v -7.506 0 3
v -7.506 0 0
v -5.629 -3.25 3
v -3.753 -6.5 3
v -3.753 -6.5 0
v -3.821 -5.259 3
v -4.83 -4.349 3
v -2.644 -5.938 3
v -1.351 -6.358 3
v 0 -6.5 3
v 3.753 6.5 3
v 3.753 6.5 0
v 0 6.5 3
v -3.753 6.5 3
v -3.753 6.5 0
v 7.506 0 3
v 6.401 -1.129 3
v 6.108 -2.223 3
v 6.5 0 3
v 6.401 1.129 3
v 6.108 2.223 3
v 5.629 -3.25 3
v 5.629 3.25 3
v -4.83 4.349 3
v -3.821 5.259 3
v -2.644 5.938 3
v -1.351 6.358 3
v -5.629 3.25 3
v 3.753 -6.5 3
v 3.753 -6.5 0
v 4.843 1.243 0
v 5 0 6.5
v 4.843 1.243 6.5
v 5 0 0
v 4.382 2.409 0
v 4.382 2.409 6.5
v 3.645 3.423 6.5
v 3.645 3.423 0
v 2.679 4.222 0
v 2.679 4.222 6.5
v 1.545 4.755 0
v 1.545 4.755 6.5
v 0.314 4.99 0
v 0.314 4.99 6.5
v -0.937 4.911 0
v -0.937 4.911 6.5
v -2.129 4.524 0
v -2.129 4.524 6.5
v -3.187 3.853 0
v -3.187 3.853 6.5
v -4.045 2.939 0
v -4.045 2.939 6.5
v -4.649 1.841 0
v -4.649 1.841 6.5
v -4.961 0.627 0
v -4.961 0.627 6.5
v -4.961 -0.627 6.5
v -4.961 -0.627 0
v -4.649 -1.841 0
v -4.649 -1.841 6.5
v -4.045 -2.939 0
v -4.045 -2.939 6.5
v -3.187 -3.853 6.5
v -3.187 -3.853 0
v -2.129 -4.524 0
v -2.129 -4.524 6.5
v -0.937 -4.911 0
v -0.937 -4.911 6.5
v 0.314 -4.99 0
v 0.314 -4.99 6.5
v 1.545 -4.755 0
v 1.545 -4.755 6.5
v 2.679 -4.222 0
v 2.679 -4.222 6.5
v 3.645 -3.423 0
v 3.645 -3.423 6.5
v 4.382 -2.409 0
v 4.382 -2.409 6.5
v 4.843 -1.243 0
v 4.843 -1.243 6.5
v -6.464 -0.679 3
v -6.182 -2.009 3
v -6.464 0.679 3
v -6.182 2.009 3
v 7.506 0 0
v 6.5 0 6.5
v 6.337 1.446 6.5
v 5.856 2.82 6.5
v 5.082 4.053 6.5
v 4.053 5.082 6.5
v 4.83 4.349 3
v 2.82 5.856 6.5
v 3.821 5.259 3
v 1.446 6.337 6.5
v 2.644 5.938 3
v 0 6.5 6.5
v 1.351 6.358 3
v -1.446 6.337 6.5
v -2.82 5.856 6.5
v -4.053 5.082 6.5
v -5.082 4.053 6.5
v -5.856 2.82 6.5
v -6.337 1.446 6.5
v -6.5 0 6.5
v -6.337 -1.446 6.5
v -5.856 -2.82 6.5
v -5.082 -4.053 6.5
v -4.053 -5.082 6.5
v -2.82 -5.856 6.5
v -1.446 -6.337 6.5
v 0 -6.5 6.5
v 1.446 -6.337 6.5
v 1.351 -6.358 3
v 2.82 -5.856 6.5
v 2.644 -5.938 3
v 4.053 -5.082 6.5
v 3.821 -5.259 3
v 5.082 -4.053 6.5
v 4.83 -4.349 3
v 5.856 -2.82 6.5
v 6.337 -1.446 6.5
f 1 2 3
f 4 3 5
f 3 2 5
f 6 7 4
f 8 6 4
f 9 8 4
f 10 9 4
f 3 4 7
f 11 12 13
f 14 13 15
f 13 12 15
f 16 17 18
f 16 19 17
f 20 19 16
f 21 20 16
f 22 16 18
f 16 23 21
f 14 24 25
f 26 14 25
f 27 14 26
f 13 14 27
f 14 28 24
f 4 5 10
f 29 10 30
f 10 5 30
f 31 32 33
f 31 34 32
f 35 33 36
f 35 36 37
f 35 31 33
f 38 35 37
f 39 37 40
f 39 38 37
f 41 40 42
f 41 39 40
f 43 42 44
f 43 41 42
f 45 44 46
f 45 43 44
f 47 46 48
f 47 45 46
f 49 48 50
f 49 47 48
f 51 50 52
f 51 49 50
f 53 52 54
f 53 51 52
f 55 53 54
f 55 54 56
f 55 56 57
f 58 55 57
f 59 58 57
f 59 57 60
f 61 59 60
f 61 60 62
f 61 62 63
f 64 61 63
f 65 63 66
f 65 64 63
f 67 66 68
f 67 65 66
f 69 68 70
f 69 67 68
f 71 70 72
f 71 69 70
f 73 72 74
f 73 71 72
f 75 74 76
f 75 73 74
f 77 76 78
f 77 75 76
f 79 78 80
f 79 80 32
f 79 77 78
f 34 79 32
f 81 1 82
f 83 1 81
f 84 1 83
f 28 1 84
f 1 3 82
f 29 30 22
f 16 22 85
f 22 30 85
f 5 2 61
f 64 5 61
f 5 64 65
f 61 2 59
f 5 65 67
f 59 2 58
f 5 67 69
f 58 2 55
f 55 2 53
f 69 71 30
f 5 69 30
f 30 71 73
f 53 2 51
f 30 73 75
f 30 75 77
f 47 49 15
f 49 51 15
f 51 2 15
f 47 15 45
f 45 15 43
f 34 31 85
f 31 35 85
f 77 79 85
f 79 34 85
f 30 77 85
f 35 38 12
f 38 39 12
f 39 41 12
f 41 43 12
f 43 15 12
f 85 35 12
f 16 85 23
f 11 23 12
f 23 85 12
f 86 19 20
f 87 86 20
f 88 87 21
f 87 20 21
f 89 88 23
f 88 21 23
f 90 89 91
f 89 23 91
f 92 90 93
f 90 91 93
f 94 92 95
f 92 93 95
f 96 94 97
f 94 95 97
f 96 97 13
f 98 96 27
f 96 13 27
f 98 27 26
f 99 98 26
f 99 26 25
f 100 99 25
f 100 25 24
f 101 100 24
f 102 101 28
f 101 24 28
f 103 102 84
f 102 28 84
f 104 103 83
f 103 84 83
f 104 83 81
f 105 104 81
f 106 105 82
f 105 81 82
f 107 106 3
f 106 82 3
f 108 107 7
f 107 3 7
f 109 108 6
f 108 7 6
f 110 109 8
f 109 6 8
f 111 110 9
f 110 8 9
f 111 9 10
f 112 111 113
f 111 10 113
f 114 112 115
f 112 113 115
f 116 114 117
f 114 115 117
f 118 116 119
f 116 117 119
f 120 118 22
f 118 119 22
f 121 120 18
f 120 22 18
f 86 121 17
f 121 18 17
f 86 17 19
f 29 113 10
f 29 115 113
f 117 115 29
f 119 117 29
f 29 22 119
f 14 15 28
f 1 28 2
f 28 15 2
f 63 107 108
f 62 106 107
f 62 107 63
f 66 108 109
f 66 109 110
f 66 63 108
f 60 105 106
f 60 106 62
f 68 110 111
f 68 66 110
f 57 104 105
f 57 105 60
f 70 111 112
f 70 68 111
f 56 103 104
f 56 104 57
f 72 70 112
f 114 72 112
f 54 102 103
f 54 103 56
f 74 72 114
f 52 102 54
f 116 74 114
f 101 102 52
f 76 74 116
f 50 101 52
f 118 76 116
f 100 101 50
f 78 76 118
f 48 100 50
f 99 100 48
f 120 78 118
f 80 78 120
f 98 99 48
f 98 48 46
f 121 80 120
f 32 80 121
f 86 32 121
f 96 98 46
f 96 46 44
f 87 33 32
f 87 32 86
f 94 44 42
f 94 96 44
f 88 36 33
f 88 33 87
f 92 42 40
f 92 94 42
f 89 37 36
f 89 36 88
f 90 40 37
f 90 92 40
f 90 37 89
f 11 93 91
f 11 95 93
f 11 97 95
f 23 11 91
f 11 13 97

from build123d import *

# Parameters (mm, degrees)
SKETCH_R      = 5
PAD_DEPTH     = 3
SKETCH001_R   = 6.5
SKETCH001_R_2 = 5
PAD001_DEPTH  = 3.5


with BuildPart() as part:
    # Sketch → Pad (new body)
    with BuildSketch(Plane.XY):
        Polygon((7.505553, 0), (3.752777, 6.5), (-3.752777, 6.5), (-7.505553, 0), (-3.752777, -6.5), (3.752777, -6.5), align=None)
        Circle(SKETCH_R, mode=Mode.SUBTRACT)
    extrude(amount=PAD_DEPTH)

    # Sketch001 (on Face9 of Pad) → Pad001 (join)
    with BuildSketch(Plane.XY.offset(3)):
        Circle(SKETCH001_R)
        Circle(SKETCH001_R_2, mode=Mode.SUBTRACT)
    extrude(amount=PAD001_DEPTH)


solid = part.part
